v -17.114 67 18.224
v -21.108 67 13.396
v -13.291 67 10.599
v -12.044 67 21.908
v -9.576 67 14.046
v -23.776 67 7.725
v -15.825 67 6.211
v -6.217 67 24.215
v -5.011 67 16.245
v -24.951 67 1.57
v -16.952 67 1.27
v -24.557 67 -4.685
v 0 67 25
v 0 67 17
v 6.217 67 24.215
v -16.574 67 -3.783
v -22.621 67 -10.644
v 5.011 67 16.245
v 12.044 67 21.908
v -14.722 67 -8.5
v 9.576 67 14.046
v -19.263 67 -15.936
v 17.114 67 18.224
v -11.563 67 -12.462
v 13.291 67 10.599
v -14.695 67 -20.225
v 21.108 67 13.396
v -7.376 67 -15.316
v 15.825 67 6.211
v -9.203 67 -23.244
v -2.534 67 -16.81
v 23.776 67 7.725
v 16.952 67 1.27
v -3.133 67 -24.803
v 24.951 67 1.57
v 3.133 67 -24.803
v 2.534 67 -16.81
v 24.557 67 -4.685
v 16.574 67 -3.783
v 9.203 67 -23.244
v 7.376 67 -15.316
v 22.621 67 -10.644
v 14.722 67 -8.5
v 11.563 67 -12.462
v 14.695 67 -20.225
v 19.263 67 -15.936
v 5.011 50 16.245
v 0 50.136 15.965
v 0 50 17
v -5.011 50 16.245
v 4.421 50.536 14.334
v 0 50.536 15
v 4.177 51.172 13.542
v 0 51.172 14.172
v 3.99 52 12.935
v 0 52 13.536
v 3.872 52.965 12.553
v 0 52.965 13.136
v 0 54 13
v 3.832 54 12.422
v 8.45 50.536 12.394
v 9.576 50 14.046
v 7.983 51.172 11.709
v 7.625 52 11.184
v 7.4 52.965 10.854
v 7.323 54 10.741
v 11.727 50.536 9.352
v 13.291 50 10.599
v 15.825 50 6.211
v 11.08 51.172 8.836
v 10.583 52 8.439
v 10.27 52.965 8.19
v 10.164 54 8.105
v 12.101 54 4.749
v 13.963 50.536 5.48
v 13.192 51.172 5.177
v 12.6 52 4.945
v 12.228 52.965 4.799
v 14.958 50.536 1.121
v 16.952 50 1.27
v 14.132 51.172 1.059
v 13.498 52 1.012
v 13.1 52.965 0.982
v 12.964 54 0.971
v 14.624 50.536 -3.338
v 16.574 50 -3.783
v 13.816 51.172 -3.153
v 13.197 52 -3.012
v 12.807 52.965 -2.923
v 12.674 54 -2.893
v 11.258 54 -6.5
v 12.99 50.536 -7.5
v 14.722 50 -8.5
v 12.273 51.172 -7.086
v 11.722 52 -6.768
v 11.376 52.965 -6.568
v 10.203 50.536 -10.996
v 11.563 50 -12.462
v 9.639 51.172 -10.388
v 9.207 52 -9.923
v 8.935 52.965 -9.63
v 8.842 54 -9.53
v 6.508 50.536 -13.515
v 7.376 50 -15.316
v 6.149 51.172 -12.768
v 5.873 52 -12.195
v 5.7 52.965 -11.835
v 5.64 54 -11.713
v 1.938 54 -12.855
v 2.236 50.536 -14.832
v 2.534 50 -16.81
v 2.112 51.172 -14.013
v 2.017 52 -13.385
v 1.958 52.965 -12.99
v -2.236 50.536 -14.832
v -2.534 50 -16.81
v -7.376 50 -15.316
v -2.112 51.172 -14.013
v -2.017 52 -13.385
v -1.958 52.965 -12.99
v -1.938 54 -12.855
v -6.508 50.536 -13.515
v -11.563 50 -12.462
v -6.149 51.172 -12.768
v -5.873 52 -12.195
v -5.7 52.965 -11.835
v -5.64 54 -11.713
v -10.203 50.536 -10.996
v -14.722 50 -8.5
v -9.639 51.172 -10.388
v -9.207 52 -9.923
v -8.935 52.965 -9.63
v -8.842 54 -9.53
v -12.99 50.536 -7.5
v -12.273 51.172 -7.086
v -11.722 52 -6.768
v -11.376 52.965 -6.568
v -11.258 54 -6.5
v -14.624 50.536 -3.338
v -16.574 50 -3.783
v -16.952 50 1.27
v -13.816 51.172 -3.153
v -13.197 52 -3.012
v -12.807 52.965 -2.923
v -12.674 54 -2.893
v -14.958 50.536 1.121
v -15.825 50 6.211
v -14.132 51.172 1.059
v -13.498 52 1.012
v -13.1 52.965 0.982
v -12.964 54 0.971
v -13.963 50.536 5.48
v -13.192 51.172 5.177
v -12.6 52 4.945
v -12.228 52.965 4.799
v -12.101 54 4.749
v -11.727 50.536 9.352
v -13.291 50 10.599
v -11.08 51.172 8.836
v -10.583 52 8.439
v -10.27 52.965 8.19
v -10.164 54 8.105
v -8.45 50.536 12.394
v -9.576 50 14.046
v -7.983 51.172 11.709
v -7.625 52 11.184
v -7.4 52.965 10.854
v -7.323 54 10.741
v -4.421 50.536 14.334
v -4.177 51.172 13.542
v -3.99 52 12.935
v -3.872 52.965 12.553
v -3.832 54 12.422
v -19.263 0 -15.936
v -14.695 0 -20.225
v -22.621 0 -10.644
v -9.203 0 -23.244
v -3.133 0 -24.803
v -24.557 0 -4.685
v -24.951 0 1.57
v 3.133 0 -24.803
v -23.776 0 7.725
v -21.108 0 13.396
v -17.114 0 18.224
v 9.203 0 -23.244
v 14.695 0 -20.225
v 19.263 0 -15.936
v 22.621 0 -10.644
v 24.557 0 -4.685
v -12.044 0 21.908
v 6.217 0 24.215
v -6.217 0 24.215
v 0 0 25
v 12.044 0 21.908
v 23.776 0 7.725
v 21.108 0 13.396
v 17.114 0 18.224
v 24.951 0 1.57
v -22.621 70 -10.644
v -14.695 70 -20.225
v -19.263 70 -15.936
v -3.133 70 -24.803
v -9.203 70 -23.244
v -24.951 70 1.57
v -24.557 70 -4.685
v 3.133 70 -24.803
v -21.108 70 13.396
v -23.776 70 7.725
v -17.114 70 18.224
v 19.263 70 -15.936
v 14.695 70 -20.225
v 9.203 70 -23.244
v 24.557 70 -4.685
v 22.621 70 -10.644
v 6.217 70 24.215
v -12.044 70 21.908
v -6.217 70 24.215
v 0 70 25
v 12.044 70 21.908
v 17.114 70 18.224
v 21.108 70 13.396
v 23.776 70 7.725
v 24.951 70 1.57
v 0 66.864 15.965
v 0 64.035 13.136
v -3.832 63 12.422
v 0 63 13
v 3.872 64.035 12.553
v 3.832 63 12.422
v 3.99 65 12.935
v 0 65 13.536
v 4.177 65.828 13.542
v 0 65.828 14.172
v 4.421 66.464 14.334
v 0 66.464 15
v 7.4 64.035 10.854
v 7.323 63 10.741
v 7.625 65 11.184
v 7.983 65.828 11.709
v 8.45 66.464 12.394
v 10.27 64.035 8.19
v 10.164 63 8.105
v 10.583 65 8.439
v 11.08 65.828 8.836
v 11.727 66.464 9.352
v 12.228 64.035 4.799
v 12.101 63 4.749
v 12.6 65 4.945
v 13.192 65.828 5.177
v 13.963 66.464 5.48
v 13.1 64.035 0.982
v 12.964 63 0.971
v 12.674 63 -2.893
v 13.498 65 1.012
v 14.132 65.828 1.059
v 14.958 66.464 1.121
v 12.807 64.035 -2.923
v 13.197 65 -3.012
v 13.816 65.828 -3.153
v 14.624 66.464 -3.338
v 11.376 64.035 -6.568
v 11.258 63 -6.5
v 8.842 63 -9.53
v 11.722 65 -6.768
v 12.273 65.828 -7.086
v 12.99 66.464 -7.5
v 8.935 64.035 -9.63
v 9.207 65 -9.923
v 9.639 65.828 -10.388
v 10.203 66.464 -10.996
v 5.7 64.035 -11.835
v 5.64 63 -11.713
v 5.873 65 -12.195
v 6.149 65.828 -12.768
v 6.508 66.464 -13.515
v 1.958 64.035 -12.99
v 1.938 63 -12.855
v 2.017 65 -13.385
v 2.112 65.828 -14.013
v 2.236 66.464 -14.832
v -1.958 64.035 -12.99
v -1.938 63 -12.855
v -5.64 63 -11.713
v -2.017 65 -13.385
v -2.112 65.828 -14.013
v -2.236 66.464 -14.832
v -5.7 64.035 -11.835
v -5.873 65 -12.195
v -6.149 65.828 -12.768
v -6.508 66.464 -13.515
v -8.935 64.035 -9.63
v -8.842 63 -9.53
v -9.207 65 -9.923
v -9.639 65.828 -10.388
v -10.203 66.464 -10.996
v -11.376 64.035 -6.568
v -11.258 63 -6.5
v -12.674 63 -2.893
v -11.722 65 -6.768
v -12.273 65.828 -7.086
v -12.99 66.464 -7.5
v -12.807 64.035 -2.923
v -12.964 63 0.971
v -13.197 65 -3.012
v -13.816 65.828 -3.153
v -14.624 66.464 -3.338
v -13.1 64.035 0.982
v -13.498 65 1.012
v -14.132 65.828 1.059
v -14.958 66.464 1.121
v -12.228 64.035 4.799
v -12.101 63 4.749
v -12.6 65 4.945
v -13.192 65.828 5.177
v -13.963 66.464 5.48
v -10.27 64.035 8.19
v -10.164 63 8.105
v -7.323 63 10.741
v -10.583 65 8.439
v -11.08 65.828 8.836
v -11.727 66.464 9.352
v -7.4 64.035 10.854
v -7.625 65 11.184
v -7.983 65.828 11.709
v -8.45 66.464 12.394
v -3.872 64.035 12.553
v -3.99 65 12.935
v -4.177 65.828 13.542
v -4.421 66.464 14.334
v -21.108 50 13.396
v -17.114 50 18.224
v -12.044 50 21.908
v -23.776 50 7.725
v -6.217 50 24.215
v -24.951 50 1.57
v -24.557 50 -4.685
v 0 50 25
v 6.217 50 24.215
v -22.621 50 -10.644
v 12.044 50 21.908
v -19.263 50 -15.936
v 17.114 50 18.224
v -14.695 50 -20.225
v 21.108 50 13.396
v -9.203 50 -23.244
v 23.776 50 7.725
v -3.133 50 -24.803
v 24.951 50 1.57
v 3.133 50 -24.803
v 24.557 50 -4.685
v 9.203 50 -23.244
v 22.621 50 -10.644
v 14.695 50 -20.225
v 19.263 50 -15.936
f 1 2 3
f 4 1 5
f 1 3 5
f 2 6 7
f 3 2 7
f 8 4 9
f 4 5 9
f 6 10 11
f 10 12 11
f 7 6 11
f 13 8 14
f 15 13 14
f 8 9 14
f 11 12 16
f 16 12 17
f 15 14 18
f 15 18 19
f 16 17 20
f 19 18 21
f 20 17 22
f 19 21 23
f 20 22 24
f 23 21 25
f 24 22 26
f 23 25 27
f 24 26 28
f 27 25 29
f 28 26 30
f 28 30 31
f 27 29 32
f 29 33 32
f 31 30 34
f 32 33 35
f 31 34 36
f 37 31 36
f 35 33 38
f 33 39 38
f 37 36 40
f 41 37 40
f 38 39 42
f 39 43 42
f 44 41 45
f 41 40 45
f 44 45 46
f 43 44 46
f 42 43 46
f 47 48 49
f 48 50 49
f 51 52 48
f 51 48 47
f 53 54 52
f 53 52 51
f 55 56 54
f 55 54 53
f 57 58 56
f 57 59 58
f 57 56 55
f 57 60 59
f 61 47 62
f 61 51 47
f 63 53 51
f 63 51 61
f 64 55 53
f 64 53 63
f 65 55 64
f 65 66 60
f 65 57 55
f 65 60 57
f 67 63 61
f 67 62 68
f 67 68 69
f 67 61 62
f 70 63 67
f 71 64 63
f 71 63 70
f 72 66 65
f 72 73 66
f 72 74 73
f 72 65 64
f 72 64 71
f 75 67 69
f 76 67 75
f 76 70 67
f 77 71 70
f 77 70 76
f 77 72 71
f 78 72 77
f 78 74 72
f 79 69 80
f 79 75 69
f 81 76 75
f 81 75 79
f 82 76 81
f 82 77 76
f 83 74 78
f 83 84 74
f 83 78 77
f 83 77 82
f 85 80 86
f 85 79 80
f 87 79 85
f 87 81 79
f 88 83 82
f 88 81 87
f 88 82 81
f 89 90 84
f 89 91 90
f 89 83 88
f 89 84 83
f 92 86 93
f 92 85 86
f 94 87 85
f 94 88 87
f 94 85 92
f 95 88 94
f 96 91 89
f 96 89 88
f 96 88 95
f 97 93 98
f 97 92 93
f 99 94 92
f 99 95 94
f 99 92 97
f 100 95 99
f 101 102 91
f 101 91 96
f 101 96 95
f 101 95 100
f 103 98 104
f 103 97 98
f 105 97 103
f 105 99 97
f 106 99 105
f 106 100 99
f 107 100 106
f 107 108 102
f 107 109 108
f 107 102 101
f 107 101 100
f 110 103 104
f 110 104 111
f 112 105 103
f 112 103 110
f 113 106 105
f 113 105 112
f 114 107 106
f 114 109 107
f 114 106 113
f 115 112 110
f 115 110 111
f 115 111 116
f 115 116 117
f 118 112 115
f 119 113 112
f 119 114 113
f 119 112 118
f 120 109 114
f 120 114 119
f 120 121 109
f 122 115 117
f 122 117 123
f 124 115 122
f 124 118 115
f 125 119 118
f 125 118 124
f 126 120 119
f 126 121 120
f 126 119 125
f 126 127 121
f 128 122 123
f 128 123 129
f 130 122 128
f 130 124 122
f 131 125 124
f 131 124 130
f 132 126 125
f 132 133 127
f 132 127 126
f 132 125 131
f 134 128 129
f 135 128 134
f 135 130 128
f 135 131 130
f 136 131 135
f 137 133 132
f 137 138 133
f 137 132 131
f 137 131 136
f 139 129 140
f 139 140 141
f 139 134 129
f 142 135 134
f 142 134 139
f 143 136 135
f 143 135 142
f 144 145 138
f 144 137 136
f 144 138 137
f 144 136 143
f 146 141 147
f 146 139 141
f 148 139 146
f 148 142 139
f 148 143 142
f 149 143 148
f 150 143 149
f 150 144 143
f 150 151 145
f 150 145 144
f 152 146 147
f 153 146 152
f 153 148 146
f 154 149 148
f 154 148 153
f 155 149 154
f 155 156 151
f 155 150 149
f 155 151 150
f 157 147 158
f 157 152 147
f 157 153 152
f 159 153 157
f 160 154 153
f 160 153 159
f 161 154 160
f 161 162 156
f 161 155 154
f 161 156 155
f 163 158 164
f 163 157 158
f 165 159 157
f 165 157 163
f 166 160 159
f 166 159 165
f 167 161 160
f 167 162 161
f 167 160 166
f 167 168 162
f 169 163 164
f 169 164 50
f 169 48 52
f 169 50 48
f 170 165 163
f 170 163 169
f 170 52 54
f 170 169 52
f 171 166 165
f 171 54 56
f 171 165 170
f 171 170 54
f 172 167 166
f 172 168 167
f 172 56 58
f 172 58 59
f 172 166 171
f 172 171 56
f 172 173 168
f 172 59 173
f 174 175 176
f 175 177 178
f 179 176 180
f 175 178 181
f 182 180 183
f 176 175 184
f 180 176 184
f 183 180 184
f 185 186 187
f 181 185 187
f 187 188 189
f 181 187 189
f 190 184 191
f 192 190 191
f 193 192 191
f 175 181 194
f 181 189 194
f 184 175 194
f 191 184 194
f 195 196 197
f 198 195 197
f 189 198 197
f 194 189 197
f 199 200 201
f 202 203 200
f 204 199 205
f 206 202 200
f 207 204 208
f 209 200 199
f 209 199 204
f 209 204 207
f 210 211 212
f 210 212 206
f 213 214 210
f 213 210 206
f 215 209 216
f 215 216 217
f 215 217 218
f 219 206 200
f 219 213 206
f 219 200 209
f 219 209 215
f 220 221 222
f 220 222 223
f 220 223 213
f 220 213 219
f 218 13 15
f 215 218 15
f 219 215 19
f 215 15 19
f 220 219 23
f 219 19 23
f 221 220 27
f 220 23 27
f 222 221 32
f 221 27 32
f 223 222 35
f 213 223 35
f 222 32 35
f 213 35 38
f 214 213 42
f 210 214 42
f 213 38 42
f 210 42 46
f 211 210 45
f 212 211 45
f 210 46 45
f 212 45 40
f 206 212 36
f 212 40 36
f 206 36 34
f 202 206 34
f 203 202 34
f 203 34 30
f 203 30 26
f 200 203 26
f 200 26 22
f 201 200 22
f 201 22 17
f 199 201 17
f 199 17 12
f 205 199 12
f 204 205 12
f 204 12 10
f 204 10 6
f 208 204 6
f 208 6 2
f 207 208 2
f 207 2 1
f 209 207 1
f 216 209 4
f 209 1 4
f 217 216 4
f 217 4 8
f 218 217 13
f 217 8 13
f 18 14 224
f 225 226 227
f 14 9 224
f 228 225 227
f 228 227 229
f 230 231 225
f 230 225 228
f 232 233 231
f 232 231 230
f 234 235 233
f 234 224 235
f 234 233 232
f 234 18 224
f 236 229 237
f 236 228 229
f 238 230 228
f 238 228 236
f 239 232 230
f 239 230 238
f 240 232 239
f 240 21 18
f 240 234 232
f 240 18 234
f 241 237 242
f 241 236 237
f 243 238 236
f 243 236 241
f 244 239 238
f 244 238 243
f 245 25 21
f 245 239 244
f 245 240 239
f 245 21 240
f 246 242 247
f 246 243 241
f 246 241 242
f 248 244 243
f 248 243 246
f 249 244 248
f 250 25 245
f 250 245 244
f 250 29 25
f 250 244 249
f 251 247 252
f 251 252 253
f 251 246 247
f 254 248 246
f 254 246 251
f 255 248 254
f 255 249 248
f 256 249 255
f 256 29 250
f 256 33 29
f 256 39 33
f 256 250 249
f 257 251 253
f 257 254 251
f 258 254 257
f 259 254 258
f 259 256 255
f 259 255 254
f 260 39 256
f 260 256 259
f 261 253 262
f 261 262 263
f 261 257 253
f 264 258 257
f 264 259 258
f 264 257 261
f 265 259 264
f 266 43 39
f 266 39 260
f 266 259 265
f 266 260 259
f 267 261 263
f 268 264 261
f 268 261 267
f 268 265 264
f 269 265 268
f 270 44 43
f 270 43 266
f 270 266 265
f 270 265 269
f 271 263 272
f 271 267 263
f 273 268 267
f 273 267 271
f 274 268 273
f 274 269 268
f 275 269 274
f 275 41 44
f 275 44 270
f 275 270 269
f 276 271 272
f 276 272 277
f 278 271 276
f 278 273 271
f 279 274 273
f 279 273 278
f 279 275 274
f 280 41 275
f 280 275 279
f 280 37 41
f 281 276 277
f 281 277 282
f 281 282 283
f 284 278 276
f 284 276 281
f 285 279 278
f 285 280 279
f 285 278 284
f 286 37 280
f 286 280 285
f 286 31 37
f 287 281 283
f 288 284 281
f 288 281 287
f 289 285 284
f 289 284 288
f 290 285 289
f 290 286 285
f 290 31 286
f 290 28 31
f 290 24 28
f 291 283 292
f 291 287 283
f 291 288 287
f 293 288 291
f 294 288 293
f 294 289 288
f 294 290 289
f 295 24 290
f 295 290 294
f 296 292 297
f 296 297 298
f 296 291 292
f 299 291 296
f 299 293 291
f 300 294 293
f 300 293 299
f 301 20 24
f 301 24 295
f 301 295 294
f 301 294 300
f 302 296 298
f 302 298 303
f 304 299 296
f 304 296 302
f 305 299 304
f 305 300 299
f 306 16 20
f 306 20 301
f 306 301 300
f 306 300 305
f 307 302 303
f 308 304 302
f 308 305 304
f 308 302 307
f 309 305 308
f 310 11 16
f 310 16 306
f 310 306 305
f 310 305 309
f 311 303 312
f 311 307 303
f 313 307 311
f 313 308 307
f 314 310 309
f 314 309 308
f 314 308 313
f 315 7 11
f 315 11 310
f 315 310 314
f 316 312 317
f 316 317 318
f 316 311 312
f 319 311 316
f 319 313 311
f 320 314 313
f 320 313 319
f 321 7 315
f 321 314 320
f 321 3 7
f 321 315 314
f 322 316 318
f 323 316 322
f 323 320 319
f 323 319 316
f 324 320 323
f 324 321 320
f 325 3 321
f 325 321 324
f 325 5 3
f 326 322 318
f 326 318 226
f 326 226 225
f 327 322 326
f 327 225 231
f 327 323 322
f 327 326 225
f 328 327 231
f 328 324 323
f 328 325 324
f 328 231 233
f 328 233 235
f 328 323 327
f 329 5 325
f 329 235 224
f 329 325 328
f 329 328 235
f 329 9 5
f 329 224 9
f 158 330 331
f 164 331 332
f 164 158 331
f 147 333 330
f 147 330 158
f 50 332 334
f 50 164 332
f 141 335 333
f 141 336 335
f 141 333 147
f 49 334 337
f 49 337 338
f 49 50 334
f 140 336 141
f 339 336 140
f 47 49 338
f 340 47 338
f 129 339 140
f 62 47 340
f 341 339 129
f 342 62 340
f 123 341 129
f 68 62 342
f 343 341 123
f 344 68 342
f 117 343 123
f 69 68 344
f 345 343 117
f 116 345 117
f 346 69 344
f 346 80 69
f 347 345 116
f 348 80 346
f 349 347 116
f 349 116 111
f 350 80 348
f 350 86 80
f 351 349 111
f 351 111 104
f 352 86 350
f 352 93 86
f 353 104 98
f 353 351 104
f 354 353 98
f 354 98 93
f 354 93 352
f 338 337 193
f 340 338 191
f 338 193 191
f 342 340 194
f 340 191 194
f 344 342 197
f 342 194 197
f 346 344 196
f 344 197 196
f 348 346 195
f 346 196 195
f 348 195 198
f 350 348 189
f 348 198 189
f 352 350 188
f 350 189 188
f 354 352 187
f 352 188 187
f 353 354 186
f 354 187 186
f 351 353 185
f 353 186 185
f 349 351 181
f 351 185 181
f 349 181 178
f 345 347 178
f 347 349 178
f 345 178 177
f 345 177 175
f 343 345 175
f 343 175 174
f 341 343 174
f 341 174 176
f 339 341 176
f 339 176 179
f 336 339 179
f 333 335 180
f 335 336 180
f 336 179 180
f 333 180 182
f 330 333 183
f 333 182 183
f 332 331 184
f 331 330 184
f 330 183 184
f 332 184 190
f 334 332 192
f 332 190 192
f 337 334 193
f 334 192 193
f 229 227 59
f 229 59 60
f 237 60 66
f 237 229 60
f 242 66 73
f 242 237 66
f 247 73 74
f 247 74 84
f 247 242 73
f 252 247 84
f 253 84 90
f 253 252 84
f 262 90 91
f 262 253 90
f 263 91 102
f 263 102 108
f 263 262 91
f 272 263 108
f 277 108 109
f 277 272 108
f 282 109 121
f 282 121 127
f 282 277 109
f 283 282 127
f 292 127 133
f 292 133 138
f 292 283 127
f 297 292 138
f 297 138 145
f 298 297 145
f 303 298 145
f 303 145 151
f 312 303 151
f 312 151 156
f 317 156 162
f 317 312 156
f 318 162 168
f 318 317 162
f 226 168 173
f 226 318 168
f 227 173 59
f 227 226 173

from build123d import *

# Parameters (mm, degrees)
SKETCH1_R           = 25
BOSS_EXTRUDE1_DEPTH = 70
SKETCH2_OUTSIDE_W   = 71.9
SKETCH2_OUTSIDE_H   = 71.9
SKETCH2_OUTSIDE_R   = 13
CUT_EXTRUDE1_DEPTH  = 17
FILLET1_R           = 4


with BuildPart() as part:
    # Sketch1 → Boss-Extrude1 (new body)
    with BuildSketch(Plane(origin=(0, 0, 0), x_dir=(1, 0, 0), z_dir=(0, 1, 0))):
        with Locations(Location((0, 0, 0), (0, 0, 270))):
            Circle(SKETCH1_R)
    extrude(amount=BOSS_EXTRUDE1_DEPTH)

    # Sketch2 outside → Cut-Extrude1 (cut)
    with BuildSketch(Plane(origin=(0, 67, 0), x_dir=(1, 0, 0), z_dir=(0, 1, 0))):
        Rectangle(SKETCH2_OUTSIDE_W, SKETCH2_OUTSIDE_H)
        with Locations(Location((0, 0, 0), (0, 0, 270))):
            Circle(SKETCH2_OUTSIDE_R, mode=Mode.SUBTRACT)
    extrude(amount=-CUT_EXTRUDE1_DEPTH, mode=Mode.SUBTRACT)

    # Fillet1
    fillet1_edges = [part.edges().sort_by_distance(p)[0] for p in [
        (0, 67, -13),
        (0, 50, -13),
    ]]
    fillet(fillet1_edges, radius=FILLET1_R)


solid = part.part
